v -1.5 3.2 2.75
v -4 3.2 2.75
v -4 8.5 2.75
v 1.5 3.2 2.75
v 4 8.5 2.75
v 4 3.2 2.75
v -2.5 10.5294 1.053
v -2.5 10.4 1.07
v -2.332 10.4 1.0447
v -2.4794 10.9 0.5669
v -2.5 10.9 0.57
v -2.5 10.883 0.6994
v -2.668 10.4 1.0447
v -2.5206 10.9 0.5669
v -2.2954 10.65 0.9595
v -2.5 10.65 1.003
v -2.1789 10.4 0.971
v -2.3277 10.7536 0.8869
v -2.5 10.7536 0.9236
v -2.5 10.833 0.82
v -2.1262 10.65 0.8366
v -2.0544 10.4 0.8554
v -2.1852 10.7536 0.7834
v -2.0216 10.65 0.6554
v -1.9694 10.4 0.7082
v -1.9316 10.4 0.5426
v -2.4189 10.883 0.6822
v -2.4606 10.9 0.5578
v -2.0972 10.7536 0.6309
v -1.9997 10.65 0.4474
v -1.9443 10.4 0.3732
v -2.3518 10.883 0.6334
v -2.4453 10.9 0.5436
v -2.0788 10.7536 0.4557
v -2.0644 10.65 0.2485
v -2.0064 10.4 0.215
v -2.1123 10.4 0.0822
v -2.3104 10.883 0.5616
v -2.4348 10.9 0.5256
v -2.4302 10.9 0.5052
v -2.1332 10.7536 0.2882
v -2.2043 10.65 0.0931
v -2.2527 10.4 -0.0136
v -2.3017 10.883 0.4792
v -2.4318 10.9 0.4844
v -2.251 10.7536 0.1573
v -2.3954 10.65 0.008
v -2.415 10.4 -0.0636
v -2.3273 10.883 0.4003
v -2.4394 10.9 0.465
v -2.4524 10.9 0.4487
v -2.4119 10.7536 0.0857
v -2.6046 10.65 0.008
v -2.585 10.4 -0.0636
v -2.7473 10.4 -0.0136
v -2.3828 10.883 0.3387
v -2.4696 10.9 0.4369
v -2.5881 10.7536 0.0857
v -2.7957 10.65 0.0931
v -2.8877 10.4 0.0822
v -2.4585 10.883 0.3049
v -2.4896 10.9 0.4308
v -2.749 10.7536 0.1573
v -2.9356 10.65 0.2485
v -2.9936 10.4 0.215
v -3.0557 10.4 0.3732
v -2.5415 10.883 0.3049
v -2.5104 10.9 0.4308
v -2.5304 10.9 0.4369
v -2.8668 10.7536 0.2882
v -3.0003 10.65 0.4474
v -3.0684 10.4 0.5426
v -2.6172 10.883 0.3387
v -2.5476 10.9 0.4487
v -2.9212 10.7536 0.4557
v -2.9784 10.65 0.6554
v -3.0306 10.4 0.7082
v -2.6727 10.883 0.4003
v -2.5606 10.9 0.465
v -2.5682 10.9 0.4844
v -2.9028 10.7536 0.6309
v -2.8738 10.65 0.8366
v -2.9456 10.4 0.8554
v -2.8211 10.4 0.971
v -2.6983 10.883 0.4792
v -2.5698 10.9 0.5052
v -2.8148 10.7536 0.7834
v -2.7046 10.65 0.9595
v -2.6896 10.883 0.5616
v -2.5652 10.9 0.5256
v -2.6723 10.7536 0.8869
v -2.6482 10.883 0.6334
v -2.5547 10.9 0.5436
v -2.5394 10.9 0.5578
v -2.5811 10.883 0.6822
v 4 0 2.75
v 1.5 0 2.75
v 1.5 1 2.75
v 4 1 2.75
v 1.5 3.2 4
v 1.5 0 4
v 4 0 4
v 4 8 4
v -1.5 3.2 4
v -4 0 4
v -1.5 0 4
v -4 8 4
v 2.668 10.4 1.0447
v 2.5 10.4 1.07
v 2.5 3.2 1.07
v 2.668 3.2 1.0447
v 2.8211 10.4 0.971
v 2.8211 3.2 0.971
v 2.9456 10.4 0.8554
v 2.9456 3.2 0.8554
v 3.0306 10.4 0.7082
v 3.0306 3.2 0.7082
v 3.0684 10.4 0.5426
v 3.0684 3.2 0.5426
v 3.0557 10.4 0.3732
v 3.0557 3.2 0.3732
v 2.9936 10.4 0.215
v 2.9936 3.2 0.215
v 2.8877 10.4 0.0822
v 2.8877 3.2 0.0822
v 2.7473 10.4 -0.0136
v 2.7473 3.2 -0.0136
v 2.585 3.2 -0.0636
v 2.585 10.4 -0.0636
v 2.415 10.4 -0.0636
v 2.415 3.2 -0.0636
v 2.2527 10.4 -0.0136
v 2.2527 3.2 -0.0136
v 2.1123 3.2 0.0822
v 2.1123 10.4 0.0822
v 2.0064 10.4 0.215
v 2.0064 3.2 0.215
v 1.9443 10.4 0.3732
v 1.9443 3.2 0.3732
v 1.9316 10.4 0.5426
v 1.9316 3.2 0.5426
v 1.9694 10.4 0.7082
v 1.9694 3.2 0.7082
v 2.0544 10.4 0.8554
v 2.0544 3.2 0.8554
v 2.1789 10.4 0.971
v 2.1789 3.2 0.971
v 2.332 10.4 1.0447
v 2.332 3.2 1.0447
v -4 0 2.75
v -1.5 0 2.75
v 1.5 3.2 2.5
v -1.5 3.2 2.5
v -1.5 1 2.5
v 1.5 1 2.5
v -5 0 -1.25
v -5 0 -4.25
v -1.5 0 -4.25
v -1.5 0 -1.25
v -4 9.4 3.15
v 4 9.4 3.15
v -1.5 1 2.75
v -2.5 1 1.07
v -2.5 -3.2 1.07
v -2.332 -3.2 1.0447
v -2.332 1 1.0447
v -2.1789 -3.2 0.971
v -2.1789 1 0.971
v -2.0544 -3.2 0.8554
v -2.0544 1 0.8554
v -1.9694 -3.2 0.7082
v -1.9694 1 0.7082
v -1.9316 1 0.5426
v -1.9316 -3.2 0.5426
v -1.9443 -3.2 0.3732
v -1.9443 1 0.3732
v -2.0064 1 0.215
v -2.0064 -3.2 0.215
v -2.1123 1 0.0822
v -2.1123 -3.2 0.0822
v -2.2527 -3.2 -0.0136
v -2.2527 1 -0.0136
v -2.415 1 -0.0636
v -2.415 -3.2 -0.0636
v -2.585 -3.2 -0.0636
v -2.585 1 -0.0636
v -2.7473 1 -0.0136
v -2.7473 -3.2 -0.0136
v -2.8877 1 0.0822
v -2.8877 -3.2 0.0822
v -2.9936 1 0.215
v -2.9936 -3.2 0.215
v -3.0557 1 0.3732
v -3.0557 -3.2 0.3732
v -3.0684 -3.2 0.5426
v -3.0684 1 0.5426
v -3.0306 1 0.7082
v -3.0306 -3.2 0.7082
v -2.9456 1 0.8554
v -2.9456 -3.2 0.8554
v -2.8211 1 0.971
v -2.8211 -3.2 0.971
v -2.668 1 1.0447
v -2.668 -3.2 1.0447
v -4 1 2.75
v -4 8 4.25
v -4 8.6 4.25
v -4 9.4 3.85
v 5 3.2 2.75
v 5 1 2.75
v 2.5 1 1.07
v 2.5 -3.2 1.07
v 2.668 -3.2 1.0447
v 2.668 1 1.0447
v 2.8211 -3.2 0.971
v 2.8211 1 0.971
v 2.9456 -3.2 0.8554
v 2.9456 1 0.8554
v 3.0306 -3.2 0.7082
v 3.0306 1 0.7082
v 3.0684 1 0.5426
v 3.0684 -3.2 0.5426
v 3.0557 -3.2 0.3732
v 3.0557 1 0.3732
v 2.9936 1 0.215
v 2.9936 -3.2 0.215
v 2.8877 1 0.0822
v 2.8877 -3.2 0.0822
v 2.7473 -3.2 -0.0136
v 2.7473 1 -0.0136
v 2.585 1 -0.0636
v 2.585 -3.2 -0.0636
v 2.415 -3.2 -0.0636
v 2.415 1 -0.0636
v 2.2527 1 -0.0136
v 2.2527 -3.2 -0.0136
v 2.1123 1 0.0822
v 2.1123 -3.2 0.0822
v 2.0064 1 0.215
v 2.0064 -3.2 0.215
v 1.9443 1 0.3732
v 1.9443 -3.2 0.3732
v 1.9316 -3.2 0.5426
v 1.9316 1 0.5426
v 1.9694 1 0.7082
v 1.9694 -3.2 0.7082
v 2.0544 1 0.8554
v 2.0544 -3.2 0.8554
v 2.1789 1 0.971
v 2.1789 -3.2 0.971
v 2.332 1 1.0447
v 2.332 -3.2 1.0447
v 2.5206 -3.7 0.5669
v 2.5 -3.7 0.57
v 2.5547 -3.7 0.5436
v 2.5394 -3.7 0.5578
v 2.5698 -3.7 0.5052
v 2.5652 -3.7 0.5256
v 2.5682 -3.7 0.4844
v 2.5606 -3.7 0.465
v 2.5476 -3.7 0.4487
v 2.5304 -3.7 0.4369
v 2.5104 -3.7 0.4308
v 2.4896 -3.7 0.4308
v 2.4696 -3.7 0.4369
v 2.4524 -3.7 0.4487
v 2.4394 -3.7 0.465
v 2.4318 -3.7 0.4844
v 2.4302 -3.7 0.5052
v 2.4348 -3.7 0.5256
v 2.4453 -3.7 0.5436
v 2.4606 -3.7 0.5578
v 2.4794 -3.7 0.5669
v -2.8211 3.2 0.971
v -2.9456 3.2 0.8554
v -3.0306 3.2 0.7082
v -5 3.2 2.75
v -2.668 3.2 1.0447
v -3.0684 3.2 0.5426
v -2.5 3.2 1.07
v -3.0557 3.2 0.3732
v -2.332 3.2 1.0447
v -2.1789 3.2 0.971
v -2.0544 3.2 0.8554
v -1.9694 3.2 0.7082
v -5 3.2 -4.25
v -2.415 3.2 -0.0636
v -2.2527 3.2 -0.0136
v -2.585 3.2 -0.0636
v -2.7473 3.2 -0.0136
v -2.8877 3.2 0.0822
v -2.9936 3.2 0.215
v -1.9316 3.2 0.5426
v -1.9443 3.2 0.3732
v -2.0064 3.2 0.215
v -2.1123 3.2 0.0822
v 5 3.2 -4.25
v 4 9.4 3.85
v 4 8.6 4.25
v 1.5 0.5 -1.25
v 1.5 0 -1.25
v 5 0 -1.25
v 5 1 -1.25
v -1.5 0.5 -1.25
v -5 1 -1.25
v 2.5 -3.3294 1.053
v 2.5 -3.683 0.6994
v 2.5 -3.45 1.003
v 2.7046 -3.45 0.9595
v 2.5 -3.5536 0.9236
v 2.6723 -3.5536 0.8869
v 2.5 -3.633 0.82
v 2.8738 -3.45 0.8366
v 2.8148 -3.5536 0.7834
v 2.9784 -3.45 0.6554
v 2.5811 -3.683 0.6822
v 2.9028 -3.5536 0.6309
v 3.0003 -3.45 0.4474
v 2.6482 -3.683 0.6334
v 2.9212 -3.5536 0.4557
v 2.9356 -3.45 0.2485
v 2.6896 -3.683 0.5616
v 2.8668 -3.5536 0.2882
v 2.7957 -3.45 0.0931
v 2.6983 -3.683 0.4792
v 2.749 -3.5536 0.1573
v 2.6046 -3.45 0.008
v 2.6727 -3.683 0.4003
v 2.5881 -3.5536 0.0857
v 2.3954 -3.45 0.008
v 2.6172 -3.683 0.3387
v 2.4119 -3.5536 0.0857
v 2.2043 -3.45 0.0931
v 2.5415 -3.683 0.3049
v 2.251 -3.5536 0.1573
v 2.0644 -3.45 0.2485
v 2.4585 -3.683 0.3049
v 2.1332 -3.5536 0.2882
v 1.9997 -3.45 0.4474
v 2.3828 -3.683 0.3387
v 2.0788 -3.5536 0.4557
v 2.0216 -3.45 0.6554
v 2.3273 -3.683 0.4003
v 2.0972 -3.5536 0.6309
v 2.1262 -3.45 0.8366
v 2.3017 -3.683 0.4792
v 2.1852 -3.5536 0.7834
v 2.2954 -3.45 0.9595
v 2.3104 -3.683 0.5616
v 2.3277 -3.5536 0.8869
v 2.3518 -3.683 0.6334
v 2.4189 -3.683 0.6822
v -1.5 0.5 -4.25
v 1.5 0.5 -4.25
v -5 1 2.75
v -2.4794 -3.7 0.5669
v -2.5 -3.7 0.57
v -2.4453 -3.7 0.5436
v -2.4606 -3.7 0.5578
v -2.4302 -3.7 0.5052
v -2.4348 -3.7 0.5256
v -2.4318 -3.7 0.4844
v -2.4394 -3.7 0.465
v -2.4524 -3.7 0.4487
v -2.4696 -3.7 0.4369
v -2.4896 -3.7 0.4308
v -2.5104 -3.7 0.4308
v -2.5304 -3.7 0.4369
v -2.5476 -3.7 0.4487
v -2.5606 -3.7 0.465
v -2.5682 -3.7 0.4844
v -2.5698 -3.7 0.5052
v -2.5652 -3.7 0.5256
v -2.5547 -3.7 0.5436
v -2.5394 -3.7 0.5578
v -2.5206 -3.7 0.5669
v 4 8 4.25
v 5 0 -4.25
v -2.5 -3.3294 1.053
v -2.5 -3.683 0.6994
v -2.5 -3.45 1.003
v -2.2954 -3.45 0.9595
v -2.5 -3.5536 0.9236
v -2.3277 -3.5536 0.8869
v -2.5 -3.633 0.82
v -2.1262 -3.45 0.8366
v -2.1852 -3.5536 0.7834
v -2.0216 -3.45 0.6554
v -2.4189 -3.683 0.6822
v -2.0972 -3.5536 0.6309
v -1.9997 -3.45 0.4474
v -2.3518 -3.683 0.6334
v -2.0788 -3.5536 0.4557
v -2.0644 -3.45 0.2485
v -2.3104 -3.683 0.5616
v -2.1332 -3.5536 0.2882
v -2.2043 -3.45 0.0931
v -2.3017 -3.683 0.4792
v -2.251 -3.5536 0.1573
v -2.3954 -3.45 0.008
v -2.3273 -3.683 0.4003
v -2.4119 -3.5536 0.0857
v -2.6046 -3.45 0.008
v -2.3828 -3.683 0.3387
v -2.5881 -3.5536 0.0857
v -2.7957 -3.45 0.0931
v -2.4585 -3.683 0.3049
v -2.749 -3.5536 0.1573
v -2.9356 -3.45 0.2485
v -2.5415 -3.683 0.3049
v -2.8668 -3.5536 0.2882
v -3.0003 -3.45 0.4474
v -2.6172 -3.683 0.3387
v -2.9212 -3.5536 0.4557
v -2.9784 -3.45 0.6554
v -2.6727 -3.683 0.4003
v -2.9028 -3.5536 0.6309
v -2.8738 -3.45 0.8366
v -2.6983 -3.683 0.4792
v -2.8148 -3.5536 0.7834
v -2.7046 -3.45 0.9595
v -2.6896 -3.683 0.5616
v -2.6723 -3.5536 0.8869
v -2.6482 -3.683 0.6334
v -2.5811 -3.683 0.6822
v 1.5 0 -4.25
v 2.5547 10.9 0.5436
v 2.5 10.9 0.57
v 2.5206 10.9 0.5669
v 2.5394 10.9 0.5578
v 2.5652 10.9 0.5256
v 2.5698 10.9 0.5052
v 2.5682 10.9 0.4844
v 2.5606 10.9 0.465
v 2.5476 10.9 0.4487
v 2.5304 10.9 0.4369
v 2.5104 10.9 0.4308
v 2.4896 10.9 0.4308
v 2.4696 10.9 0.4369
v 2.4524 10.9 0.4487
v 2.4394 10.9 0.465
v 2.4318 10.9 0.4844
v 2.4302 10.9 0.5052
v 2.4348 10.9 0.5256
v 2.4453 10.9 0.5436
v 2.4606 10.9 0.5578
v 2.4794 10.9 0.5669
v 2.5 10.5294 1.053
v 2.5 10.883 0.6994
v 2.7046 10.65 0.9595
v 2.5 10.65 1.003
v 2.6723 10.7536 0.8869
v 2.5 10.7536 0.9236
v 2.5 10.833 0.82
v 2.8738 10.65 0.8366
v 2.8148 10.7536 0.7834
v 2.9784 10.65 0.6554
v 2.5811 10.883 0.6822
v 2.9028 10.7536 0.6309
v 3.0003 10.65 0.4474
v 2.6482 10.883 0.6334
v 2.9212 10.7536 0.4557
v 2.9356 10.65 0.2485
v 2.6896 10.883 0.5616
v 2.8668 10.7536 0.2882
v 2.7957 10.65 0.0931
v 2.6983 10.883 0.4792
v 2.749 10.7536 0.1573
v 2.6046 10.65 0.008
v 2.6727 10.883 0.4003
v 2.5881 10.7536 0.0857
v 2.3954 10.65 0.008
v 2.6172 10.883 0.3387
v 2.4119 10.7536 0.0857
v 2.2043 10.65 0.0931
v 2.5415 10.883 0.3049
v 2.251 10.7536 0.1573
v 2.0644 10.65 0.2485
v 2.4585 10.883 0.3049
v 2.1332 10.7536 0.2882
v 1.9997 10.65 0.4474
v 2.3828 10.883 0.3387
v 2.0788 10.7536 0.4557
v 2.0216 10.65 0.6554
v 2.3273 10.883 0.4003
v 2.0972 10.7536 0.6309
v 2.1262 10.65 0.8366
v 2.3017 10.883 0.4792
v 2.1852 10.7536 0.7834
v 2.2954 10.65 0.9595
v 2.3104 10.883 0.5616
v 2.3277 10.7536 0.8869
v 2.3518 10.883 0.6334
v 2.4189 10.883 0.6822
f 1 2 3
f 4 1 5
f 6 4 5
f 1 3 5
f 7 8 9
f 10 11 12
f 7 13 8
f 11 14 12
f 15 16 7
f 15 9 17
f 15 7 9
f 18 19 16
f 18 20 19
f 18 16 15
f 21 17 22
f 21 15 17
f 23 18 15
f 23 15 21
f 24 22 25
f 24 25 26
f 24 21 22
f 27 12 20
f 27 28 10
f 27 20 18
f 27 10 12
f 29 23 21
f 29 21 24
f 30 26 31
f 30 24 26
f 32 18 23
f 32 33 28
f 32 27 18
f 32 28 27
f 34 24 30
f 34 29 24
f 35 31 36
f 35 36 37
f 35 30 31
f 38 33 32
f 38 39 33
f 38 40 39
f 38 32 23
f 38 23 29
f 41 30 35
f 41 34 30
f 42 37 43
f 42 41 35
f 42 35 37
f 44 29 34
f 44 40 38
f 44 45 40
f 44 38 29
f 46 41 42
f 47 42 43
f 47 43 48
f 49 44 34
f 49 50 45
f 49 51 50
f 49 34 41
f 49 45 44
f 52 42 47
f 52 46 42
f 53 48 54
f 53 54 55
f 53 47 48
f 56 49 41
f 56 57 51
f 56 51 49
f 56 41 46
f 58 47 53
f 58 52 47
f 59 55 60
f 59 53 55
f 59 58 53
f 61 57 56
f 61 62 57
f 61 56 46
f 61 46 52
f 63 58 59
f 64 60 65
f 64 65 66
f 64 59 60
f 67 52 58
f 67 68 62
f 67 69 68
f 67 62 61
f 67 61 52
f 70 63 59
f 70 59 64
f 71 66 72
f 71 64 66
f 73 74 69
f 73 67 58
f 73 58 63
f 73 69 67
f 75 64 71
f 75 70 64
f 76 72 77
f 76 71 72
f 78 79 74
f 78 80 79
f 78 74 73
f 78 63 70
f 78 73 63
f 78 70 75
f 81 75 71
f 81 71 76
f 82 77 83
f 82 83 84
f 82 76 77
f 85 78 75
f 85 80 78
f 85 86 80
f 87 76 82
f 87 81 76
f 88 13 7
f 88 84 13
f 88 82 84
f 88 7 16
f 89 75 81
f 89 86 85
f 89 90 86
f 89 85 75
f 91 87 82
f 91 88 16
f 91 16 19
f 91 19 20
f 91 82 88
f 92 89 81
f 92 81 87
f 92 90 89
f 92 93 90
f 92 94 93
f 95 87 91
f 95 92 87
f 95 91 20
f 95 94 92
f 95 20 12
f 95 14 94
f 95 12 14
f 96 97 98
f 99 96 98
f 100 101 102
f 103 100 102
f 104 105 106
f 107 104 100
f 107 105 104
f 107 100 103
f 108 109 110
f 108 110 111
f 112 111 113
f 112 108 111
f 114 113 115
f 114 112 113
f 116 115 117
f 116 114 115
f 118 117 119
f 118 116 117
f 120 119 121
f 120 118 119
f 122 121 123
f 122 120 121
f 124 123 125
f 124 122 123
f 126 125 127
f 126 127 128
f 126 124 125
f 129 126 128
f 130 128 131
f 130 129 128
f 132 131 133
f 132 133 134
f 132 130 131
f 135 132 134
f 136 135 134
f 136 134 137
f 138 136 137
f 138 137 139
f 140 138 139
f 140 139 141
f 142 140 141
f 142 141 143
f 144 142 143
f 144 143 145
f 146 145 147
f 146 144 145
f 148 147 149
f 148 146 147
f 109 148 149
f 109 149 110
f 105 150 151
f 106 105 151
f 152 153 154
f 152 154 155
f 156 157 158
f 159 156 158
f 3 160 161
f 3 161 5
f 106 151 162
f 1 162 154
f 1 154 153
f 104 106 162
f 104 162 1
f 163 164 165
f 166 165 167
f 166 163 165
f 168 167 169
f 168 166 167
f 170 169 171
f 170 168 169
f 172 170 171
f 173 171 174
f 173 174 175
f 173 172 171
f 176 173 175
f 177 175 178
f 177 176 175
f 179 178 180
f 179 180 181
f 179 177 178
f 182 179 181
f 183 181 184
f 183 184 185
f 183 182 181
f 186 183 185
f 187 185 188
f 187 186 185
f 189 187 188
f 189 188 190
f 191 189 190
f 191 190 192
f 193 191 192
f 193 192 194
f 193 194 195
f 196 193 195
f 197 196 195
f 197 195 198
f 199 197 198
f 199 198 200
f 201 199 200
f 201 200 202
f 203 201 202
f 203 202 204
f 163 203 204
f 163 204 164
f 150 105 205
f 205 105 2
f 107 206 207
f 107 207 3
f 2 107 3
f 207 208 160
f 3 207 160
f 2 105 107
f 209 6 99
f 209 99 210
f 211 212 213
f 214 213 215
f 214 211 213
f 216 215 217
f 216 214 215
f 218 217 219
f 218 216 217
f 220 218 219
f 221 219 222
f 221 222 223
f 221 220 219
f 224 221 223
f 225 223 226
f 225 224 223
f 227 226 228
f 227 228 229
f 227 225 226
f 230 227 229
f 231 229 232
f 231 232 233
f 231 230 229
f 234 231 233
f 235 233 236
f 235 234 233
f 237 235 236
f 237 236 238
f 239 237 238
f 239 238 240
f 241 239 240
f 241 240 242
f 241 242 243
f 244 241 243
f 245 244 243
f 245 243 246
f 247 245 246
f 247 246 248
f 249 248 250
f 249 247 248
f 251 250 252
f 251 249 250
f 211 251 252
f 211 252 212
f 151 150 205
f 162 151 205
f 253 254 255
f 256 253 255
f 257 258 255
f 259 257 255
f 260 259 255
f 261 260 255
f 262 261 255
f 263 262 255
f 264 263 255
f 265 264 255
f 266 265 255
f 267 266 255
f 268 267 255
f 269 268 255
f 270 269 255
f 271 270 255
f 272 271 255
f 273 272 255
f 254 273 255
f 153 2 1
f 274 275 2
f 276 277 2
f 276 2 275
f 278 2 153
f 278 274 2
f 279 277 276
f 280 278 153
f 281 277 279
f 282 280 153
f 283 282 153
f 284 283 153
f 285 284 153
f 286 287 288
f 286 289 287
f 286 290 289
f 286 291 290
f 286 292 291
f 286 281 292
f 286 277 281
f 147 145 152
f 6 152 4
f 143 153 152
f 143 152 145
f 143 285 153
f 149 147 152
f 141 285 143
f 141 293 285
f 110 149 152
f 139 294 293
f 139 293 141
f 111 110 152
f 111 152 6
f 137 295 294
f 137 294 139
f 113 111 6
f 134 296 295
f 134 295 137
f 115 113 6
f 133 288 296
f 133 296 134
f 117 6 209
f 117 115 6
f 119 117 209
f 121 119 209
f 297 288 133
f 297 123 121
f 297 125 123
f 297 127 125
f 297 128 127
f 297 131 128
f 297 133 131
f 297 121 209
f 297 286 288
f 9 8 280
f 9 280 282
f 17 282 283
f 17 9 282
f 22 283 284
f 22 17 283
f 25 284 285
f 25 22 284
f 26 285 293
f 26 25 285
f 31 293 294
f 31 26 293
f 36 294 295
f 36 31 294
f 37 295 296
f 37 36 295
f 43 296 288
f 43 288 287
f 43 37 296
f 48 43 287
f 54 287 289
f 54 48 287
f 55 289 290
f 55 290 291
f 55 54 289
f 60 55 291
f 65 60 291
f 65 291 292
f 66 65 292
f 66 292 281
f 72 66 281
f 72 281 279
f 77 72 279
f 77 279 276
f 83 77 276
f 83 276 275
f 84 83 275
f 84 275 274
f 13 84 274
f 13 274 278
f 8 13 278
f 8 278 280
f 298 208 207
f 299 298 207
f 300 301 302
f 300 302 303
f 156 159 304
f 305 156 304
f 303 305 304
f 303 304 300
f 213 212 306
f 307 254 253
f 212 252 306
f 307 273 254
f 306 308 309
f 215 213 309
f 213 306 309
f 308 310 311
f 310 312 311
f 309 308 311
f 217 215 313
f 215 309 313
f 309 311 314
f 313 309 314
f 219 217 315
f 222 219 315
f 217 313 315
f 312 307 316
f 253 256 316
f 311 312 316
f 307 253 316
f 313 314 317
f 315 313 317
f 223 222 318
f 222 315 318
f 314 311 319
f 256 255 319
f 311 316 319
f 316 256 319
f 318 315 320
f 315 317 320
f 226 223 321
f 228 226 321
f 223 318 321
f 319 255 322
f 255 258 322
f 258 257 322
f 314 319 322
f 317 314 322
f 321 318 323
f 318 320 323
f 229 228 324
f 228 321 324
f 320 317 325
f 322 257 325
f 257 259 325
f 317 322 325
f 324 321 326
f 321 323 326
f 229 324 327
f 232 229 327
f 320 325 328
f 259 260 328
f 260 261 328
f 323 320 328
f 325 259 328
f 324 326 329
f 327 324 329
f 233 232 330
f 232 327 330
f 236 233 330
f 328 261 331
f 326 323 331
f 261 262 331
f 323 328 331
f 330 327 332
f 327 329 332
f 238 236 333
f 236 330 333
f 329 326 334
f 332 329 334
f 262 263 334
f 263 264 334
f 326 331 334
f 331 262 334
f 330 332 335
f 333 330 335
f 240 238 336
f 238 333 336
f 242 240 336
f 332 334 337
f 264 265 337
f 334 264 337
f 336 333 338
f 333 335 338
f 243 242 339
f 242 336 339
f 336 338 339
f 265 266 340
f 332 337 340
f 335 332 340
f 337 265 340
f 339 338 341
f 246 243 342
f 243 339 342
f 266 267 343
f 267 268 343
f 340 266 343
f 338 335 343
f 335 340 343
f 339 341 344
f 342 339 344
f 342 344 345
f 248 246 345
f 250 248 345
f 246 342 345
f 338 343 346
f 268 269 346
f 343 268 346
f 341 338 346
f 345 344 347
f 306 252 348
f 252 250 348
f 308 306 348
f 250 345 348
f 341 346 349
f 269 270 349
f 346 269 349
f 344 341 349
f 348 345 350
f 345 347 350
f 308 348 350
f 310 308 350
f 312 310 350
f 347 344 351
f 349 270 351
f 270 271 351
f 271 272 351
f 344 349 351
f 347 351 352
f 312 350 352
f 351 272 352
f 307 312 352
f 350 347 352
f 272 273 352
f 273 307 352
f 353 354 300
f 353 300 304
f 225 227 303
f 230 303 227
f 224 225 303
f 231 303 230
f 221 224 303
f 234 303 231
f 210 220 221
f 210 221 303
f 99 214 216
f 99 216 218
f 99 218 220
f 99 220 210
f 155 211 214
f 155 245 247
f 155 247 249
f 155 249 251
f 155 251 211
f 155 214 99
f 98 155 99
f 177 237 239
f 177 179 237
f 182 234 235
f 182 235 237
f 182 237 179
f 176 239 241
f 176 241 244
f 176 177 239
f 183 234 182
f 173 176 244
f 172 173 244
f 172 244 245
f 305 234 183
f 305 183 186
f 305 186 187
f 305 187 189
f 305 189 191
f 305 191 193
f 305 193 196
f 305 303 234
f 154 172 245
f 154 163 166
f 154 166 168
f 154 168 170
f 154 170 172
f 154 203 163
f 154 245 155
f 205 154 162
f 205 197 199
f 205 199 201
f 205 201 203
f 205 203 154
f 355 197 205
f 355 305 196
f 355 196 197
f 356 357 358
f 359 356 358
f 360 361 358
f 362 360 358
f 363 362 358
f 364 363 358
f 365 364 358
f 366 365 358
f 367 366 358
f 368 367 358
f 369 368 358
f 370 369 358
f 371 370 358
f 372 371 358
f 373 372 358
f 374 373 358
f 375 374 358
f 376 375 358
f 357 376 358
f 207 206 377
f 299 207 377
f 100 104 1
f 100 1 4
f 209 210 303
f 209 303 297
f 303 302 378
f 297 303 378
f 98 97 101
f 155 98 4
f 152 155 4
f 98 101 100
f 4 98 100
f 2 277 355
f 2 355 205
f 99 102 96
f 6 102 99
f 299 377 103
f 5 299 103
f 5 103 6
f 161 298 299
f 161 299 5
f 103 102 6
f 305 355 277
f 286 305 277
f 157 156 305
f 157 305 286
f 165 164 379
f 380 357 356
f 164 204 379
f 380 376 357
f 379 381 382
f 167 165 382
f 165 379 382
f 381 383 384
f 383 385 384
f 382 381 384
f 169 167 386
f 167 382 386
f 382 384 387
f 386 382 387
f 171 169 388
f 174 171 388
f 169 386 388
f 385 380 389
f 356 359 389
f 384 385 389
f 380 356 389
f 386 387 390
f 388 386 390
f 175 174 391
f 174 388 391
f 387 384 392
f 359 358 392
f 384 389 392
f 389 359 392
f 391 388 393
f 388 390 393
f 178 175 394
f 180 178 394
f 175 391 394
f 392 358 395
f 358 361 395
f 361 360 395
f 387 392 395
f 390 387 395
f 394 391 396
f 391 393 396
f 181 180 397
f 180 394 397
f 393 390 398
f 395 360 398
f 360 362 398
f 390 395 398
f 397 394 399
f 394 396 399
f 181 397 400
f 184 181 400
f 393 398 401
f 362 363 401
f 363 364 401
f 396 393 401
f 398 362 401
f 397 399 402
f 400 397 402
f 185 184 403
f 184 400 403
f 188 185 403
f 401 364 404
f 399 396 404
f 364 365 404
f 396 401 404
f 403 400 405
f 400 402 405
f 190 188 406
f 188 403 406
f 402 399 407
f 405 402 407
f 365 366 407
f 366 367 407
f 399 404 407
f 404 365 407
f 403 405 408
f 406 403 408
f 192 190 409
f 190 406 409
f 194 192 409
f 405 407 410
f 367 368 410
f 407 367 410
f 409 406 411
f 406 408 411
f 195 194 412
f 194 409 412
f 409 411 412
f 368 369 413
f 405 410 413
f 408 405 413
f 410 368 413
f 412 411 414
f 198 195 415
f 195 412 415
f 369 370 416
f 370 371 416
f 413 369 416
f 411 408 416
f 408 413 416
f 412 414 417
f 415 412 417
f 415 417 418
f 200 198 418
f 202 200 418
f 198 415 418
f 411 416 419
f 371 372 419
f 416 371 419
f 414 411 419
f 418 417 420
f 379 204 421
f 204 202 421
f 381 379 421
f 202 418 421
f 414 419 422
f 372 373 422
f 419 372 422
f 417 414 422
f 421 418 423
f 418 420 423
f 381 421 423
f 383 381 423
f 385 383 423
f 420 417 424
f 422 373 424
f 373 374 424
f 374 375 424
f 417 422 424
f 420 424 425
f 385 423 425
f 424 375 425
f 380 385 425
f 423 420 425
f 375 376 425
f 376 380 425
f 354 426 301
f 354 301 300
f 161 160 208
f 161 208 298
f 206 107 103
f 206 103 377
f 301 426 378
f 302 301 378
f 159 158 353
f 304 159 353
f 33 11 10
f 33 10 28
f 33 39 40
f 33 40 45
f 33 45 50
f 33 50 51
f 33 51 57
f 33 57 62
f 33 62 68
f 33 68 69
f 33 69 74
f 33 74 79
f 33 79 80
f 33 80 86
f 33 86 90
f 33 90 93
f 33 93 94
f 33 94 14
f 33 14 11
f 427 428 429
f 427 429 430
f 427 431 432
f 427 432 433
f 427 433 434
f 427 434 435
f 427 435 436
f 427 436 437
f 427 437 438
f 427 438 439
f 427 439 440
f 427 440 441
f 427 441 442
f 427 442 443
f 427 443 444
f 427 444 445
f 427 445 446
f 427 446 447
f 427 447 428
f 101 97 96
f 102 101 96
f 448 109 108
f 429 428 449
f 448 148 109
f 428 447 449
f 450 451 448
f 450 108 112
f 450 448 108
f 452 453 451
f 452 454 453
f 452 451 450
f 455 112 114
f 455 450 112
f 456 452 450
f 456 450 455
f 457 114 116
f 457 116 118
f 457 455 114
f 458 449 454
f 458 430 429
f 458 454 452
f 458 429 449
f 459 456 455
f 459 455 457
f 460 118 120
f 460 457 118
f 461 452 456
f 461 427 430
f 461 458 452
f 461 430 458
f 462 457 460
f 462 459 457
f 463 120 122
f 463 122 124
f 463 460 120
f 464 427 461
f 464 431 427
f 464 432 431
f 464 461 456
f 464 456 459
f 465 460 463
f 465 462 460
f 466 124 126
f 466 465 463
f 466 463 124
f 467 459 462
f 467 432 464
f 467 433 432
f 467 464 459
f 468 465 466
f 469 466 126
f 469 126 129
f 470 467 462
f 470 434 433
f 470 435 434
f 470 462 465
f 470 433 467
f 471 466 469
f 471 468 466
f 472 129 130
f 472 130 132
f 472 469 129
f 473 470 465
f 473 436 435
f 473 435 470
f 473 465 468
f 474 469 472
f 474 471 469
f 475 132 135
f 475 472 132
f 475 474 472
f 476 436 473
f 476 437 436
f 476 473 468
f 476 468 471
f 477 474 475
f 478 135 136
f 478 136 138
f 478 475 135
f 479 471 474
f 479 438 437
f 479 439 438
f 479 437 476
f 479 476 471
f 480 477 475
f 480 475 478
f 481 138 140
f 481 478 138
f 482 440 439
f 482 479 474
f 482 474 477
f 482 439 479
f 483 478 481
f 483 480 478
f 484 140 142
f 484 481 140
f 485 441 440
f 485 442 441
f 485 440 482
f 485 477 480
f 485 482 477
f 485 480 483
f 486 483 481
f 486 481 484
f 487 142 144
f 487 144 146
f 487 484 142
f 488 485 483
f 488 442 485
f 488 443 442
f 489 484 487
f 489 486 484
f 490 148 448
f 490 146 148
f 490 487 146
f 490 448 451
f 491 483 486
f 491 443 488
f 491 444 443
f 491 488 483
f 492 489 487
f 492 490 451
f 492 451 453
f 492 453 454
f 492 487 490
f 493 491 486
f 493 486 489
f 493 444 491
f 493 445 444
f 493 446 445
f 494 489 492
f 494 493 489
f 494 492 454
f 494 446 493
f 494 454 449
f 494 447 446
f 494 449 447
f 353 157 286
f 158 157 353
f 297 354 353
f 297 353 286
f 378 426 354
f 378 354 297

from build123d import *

# Parameters (mm, degrees)
CROQUIS1_W              = 10
CROQUIS1_H              = 8.5
SALIENTE_EXTRUIR1_DEPTH = 9.4
CROQUIS2_W              = 10
CROQUIS2_H              = 7
CORTAR_EXTRUIR1_DEPTH   = 6.2
CROQUIS3_W              = 0.25
CROQUIS3_H              = 8
CORTAR_EXTRUIR2_DEPTH   = 10
CROQUIS4_W              = 3
CROQUIS4_H              = 0.5
CORTAR_EXTRUIR3_DEPTH   = 10
CROQUIS5_W              = 4
CROQUIS5_H              = 1
CORTAR_EXTRUIR4_DEPTH   = 10
CROQUIS6_R              = 0.57
SALIENTE_EXTRUIR2_DEPTH = 7.3
REDONDEO2_R             = 0.5
CROQUIS7_W              = 1
CROQUIS7_H              = 1.5
CORTAR_EXTRUIR5_DEPTH   = 14.8
CROQUIS8_W              = 3
CROQUIS8_H              = 3.2
CORTAR_EXTRUIR6_DEPTH   = 1.5
CORTAR_EXTRUIR7_DEPTH   = 10


with BuildPart() as part:
    # Croquis1 → Saliente-Extruir1 (new body)
    with BuildSketch(Plane(origin=(0, 0, 0), x_dir=(1, 0, 0), z_dir=(0, 1, 0))):
        Rectangle(CROQUIS1_W, CROQUIS1_H)
    extrude(amount=SALIENTE_EXTRUIR1_DEPTH)

    # Croquis2 → Cortar-Extruir1 (cut)
    with BuildSketch(Plane(origin=(0, 9.4, 0), x_dir=(1, 0, 0), z_dir=(0, 1, 0))):
        with Locations((0, 0.75)):
            Rectangle(CROQUIS2_W, CROQUIS2_H)
    extrude(amount=-CORTAR_EXTRUIR1_DEPTH, mode=Mode.SUBTRACT)

    # Croquis3 → Cortar-Extruir2 (cut)
    with BuildSketch(Plane.ZY.offset(5)):
        with Locations((4.125, 4)):
            Rectangle(CROQUIS3_W, CROQUIS3_H)
    extrude(amount=-CORTAR_EXTRUIR2_DEPTH, mode=Mode.SUBTRACT)

    # Croquis4 → Cortar-Extruir3 (cut)
    with BuildSketch(Plane(origin=(0, 0, -4.25), x_dir=(-1, 0, 0), z_dir=(0, 0, -1))):
        with Locations((0, 0.25)):
            Rectangle(CROQUIS4_W, CROQUIS4_H)
    extrude(amount=-CORTAR_EXTRUIR3_DEPTH, mode=Mode.SUBTRACT)

    # Croquis5 → Cortar-Extruir4 (cut)
    with BuildSketch(Plane.ZY.offset(5)):
        with Locations((0.75, 0.5)):
            Rectangle(CROQUIS5_W, CROQUIS5_H)
    extrude(amount=-CORTAR_EXTRUIR4_DEPTH, mode=Mode.SUBTRACT)

    # Croquis6 → Saliente-Extruir2 (add, symmetric)
    with BuildSketch(Plane(origin=(0, 3.6, 0), x_dir=(1, 0, 0), z_dir=(0, 1, 0))):
        with Locations(Location((-2.5, -0.5, 0), (0, 0, 270))):
            Circle(CROQUIS6_R)
        with Locations(Location((2.5, -0.5, 0), (0, 0, 270))):
            Circle(CROQUIS6_R)
    extrude(amount=SALIENTE_EXTRUIR2_DEPTH, both=True)

    # Redondeo2
    redondeo2_edges = [part.edges().sort_by_distance(p)[0] for p in [
        (2.5, -3.7, -0.07),
        (2.5, 10.9, -0.07),
        (-2.5, -3.7, -0.07),
        (-2.5, 10.9, -0.07),
    ]]
    fillet(redondeo2_edges, radius=REDONDEO2_R)

    # Croquis7 → Cortar-Extruir5 (cut)
    with BuildSketch(Plane(origin=(0, 9.4, 0), x_dir=(1, 0, 0), z_dir=(0, 1, 0))):
        with Locations((-4.5, -3.5)):
            Rectangle(CROQUIS7_W, CROQUIS7_H)
        with Locations((4.5, -3.5)):
            Rectangle(CROQUIS7_W, CROQUIS7_H)
    extrude(amount=-CORTAR_EXTRUIR5_DEPTH, mode=Mode.SUBTRACT)

    # Croquis8 → Cortar-Extruir6 (cut)
    with BuildSketch(Plane.XY.offset(4)):
        with Locations((0, 1.6)):
            Rectangle(CROQUIS8_W, CROQUIS8_H)
    extrude(amount=-CORTAR_EXTRUIR6_DEPTH, mode=Mode.SUBTRACT)

    # Croquis9 → Cortar-Extruir7 (cut)
    with BuildSketch(Plane.ZY.offset(4)):
        Polygon((4.25, 8.6), (4.25, 9.4), (3.85, 9.4), align=None)
        Polygon((2.75, 8.5), (2.75, 9.4), (3.15, 9.4), align=None)
    extrude(amount=-CORTAR_EXTRUIR7_DEPTH, mode=Mode.SUBTRACT)


solid = part.part
